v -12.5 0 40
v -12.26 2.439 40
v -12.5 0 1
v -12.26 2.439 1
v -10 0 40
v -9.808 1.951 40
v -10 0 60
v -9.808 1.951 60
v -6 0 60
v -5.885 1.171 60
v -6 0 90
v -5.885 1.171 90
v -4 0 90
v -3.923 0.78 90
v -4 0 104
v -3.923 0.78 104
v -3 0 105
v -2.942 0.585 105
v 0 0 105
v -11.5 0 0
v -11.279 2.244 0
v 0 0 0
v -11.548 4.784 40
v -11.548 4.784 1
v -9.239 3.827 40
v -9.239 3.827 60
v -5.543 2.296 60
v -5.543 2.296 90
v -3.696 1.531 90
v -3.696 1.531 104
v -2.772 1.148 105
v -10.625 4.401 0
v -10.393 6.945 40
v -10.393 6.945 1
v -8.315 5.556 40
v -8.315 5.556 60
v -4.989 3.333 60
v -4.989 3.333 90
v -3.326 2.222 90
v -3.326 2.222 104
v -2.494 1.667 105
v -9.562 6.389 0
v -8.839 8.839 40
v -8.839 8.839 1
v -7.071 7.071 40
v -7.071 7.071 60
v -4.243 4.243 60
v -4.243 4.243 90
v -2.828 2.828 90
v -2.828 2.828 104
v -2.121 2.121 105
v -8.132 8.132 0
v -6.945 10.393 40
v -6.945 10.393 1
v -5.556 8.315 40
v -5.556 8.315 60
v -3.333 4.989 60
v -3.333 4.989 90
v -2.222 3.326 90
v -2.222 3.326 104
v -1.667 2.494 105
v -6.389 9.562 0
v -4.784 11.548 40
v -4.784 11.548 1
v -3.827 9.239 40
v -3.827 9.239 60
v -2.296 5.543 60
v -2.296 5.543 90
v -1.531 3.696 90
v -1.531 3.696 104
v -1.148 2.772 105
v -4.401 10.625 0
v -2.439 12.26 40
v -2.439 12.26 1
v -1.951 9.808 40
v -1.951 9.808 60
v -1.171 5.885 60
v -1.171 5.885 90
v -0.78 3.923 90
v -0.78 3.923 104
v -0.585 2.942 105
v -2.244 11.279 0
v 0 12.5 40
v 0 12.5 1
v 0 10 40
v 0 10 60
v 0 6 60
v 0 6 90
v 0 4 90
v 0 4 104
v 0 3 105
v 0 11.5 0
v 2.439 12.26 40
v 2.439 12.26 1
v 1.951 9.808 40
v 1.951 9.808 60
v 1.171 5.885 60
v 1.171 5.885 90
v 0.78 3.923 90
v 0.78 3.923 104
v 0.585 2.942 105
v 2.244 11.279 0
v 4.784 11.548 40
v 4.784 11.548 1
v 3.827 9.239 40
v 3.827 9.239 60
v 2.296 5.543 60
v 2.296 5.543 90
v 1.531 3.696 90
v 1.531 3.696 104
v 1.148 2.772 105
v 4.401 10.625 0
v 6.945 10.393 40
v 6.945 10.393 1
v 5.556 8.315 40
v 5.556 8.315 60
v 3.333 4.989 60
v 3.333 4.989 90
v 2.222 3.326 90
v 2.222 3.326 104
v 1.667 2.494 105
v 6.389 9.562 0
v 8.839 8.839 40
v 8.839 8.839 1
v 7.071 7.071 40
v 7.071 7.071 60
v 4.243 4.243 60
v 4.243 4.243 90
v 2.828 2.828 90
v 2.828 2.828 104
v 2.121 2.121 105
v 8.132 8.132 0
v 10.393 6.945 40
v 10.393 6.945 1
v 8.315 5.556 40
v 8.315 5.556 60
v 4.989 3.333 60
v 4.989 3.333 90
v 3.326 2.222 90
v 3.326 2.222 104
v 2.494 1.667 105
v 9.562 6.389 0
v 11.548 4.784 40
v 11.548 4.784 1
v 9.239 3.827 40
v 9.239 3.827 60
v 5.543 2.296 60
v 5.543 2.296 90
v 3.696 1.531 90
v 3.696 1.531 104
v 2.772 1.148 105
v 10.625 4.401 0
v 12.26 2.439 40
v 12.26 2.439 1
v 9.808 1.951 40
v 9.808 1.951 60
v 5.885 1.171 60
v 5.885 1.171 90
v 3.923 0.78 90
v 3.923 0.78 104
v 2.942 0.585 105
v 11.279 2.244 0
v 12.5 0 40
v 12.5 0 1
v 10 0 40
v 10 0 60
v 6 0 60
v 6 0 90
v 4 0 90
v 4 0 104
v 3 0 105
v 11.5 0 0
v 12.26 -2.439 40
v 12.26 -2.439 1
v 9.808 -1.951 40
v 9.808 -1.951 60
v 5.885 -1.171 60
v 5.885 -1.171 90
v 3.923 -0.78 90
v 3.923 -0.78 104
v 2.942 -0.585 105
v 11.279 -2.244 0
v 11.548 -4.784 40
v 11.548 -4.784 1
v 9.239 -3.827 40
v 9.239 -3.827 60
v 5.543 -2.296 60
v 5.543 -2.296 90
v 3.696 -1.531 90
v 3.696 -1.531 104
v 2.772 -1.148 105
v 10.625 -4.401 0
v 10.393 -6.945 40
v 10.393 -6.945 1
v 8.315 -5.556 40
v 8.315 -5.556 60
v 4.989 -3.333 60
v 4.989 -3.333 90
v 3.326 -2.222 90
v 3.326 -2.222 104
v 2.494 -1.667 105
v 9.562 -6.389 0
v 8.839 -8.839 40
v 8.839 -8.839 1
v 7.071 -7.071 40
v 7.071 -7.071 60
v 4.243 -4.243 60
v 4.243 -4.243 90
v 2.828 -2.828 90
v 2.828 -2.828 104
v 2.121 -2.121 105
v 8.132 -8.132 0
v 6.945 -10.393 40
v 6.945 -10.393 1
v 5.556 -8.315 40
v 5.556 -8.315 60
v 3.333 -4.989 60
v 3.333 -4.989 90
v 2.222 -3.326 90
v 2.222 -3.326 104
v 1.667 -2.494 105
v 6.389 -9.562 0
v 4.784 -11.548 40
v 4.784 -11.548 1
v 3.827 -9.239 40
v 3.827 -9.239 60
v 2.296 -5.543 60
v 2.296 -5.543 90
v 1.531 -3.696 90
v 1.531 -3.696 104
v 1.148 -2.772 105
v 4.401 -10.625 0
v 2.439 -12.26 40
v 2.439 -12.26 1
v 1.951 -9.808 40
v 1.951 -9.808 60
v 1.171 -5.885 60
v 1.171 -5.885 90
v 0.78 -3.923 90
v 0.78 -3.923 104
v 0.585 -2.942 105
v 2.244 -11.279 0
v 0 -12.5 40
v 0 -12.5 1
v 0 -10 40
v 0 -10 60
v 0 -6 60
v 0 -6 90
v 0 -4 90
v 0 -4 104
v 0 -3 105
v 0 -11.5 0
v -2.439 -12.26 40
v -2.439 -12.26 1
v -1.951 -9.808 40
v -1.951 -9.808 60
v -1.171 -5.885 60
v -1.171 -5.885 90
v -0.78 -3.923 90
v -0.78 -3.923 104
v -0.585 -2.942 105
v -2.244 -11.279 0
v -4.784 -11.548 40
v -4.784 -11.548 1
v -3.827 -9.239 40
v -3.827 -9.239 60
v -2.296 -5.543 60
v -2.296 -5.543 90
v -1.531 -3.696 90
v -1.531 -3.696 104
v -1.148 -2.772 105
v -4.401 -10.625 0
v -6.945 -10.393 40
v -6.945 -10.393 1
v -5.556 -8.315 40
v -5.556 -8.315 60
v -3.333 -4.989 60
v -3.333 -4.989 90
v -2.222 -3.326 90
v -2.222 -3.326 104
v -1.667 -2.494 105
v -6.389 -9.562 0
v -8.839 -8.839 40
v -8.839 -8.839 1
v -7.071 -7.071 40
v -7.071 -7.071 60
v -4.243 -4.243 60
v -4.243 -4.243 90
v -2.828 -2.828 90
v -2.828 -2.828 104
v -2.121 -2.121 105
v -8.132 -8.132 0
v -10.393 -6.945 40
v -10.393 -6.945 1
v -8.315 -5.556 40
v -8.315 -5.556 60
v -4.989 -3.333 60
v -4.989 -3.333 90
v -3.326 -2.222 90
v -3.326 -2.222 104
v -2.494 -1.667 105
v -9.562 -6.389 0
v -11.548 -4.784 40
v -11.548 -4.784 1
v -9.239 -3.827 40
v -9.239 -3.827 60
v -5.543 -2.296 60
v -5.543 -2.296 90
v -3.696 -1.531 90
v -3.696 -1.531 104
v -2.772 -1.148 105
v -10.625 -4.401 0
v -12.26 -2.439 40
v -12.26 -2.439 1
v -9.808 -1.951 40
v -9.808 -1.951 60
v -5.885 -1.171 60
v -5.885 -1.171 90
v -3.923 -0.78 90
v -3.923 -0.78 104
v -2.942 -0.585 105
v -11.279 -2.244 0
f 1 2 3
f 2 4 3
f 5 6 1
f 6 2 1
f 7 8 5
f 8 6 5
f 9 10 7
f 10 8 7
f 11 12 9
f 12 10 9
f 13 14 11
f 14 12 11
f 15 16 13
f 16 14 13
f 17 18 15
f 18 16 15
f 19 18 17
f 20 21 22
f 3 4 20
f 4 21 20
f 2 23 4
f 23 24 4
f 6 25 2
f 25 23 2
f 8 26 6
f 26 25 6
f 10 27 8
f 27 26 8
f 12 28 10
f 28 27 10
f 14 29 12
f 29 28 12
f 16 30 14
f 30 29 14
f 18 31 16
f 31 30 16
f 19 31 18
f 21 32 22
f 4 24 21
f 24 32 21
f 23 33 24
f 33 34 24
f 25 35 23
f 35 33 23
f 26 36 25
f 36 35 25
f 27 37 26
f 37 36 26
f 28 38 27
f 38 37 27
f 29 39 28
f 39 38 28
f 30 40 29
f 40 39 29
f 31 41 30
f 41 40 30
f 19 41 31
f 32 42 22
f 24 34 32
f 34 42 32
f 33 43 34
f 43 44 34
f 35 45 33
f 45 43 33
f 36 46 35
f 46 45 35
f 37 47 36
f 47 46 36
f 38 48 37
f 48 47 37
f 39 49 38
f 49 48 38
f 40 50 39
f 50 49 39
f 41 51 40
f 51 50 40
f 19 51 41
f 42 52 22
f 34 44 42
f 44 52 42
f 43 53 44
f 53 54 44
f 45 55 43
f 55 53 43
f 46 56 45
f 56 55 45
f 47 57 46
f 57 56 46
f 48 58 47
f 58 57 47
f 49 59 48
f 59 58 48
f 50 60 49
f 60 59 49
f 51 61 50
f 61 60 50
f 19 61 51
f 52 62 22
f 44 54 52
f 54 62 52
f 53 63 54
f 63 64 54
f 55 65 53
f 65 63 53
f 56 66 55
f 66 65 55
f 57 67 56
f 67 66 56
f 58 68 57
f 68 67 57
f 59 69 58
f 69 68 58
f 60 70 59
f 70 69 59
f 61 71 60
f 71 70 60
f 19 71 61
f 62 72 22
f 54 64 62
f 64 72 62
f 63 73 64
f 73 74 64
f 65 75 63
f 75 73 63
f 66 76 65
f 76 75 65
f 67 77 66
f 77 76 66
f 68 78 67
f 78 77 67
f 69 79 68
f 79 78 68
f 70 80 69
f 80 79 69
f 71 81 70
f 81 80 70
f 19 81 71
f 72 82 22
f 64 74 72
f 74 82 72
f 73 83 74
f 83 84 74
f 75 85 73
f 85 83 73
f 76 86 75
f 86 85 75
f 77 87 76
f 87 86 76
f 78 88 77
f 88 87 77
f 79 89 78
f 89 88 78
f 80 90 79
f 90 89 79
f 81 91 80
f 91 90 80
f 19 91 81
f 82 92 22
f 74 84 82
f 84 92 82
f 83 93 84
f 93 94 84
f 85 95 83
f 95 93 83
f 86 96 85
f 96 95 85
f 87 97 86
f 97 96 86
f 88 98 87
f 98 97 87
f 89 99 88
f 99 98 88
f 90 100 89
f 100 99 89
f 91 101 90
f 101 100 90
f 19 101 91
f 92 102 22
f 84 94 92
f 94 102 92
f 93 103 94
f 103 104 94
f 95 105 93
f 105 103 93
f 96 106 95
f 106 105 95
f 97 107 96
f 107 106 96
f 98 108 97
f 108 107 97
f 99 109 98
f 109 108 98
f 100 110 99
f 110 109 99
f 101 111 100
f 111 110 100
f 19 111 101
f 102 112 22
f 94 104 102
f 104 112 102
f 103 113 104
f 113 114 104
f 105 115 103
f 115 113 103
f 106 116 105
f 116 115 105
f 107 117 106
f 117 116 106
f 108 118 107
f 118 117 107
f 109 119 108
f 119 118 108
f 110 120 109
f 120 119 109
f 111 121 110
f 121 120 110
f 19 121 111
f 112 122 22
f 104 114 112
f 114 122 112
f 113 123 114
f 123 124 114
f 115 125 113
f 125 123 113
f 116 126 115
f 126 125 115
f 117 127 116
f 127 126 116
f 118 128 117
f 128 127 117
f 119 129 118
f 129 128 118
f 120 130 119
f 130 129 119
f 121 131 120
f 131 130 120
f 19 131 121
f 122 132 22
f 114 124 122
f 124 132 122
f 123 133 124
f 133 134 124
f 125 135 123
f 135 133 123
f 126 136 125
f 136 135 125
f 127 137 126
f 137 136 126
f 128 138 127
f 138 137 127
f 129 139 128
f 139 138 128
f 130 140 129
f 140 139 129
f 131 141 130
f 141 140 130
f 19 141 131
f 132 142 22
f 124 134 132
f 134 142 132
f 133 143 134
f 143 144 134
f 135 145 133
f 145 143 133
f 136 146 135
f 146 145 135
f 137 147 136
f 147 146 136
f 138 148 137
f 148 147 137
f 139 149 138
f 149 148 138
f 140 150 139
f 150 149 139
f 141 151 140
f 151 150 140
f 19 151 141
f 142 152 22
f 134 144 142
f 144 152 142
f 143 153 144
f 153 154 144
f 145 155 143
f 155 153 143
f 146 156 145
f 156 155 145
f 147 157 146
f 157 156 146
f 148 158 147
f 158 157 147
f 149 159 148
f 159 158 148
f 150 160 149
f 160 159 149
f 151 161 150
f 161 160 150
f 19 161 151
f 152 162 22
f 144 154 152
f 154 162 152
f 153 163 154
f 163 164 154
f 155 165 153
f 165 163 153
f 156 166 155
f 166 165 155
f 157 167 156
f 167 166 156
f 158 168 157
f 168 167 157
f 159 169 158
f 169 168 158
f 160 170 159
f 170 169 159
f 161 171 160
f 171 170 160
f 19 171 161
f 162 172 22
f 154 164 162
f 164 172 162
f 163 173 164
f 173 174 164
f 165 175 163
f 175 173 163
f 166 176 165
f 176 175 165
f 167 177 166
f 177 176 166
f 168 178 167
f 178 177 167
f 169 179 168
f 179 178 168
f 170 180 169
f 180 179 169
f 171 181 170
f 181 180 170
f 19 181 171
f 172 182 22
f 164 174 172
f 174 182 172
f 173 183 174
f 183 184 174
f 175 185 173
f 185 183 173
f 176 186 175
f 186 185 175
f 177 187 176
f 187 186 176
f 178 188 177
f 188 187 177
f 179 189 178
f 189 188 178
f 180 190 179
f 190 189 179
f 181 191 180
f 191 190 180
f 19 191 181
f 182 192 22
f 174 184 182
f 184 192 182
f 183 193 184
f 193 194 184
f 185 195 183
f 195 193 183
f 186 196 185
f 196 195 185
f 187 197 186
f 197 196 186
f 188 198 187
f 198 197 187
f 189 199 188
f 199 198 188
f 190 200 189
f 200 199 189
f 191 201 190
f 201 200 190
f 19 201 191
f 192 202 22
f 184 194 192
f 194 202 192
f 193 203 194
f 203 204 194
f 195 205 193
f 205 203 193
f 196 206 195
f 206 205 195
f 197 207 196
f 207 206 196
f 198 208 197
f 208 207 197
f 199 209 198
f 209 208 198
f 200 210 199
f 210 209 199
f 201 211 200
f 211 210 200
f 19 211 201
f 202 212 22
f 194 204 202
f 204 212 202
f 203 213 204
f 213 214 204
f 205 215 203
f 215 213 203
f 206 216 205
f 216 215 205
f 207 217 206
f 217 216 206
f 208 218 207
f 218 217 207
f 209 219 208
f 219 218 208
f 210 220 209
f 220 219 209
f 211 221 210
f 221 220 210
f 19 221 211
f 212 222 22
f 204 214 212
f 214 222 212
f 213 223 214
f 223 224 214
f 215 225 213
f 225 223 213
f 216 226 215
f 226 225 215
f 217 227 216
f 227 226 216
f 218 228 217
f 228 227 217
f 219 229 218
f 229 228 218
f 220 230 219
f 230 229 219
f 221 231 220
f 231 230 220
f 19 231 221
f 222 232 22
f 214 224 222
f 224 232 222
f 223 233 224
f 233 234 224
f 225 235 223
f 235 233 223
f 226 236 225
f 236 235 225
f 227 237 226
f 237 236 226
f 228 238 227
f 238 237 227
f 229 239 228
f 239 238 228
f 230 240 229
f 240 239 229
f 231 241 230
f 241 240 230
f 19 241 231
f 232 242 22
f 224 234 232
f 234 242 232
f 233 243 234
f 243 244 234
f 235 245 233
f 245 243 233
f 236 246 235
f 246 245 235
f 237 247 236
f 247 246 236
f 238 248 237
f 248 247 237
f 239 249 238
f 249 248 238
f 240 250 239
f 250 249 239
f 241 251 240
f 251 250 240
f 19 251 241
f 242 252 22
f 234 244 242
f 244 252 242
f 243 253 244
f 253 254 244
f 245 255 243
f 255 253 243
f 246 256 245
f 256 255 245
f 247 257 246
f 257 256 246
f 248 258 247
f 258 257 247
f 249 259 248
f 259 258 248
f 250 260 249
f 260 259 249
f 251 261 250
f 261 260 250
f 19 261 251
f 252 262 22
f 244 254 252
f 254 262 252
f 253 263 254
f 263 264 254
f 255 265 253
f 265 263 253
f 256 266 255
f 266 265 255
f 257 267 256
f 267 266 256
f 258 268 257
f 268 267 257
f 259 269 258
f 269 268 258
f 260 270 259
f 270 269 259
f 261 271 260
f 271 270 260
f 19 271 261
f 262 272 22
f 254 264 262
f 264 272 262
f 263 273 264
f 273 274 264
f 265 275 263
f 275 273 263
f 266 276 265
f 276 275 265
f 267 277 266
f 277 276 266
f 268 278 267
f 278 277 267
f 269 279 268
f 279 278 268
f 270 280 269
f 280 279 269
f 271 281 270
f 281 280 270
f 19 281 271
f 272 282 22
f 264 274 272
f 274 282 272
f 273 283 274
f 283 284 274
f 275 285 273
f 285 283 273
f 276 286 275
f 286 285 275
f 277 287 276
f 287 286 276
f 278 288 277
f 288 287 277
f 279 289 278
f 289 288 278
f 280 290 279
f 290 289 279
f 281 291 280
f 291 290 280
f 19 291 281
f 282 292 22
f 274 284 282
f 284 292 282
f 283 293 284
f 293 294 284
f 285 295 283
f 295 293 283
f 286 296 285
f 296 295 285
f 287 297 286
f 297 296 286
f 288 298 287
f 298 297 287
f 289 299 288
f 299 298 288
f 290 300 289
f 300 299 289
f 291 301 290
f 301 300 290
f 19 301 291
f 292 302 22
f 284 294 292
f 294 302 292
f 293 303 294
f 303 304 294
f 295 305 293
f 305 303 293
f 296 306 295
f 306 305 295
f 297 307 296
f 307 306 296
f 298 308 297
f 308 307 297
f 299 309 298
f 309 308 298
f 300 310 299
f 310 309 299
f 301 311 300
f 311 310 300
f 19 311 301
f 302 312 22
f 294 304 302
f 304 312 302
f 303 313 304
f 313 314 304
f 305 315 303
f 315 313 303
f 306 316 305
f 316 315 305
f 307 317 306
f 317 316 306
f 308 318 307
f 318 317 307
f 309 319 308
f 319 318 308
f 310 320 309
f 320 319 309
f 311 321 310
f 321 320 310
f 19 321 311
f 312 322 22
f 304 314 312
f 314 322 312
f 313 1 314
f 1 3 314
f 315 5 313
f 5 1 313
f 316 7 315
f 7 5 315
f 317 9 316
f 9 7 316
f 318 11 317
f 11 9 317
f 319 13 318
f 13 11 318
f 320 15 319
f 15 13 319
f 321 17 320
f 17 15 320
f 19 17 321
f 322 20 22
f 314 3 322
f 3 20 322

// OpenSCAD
$fn = 32;

// ----------------------------------------------------------------------
// Stepped shaft: diameters 25, 20, 12, 8 mm, 105 mm long
// ----------------------------------------------------------------------

// --- parameters (mm) ---
d1 = 25;                  // step 1 diameter
len1 = 40;                // step 1 length
d2 = 20;                  // step 2 diameter
len2 = 20;                // step 2 length
d3 = 12;                  // step 3 diameter
len3 = 30;                // step 3 length
d4 = 8;                   // step 4 diameter
len4 = 15;                // step 4 length
total = 105;              // overall length
chamfer = 1;              // end chamfer

/* closed turning profile: x is the radius, y is the length */
profile = [[0, 0], [12.5 - chamfer, 0], [12.5, chamfer], [12.5, 40], [10, 40], [10, 60], [6, 60], [6, 90], [4, 90], [4, 104], [3, 105], [0, 105]];

difference() {
  rotate_extrude() polygon(profile);
}
